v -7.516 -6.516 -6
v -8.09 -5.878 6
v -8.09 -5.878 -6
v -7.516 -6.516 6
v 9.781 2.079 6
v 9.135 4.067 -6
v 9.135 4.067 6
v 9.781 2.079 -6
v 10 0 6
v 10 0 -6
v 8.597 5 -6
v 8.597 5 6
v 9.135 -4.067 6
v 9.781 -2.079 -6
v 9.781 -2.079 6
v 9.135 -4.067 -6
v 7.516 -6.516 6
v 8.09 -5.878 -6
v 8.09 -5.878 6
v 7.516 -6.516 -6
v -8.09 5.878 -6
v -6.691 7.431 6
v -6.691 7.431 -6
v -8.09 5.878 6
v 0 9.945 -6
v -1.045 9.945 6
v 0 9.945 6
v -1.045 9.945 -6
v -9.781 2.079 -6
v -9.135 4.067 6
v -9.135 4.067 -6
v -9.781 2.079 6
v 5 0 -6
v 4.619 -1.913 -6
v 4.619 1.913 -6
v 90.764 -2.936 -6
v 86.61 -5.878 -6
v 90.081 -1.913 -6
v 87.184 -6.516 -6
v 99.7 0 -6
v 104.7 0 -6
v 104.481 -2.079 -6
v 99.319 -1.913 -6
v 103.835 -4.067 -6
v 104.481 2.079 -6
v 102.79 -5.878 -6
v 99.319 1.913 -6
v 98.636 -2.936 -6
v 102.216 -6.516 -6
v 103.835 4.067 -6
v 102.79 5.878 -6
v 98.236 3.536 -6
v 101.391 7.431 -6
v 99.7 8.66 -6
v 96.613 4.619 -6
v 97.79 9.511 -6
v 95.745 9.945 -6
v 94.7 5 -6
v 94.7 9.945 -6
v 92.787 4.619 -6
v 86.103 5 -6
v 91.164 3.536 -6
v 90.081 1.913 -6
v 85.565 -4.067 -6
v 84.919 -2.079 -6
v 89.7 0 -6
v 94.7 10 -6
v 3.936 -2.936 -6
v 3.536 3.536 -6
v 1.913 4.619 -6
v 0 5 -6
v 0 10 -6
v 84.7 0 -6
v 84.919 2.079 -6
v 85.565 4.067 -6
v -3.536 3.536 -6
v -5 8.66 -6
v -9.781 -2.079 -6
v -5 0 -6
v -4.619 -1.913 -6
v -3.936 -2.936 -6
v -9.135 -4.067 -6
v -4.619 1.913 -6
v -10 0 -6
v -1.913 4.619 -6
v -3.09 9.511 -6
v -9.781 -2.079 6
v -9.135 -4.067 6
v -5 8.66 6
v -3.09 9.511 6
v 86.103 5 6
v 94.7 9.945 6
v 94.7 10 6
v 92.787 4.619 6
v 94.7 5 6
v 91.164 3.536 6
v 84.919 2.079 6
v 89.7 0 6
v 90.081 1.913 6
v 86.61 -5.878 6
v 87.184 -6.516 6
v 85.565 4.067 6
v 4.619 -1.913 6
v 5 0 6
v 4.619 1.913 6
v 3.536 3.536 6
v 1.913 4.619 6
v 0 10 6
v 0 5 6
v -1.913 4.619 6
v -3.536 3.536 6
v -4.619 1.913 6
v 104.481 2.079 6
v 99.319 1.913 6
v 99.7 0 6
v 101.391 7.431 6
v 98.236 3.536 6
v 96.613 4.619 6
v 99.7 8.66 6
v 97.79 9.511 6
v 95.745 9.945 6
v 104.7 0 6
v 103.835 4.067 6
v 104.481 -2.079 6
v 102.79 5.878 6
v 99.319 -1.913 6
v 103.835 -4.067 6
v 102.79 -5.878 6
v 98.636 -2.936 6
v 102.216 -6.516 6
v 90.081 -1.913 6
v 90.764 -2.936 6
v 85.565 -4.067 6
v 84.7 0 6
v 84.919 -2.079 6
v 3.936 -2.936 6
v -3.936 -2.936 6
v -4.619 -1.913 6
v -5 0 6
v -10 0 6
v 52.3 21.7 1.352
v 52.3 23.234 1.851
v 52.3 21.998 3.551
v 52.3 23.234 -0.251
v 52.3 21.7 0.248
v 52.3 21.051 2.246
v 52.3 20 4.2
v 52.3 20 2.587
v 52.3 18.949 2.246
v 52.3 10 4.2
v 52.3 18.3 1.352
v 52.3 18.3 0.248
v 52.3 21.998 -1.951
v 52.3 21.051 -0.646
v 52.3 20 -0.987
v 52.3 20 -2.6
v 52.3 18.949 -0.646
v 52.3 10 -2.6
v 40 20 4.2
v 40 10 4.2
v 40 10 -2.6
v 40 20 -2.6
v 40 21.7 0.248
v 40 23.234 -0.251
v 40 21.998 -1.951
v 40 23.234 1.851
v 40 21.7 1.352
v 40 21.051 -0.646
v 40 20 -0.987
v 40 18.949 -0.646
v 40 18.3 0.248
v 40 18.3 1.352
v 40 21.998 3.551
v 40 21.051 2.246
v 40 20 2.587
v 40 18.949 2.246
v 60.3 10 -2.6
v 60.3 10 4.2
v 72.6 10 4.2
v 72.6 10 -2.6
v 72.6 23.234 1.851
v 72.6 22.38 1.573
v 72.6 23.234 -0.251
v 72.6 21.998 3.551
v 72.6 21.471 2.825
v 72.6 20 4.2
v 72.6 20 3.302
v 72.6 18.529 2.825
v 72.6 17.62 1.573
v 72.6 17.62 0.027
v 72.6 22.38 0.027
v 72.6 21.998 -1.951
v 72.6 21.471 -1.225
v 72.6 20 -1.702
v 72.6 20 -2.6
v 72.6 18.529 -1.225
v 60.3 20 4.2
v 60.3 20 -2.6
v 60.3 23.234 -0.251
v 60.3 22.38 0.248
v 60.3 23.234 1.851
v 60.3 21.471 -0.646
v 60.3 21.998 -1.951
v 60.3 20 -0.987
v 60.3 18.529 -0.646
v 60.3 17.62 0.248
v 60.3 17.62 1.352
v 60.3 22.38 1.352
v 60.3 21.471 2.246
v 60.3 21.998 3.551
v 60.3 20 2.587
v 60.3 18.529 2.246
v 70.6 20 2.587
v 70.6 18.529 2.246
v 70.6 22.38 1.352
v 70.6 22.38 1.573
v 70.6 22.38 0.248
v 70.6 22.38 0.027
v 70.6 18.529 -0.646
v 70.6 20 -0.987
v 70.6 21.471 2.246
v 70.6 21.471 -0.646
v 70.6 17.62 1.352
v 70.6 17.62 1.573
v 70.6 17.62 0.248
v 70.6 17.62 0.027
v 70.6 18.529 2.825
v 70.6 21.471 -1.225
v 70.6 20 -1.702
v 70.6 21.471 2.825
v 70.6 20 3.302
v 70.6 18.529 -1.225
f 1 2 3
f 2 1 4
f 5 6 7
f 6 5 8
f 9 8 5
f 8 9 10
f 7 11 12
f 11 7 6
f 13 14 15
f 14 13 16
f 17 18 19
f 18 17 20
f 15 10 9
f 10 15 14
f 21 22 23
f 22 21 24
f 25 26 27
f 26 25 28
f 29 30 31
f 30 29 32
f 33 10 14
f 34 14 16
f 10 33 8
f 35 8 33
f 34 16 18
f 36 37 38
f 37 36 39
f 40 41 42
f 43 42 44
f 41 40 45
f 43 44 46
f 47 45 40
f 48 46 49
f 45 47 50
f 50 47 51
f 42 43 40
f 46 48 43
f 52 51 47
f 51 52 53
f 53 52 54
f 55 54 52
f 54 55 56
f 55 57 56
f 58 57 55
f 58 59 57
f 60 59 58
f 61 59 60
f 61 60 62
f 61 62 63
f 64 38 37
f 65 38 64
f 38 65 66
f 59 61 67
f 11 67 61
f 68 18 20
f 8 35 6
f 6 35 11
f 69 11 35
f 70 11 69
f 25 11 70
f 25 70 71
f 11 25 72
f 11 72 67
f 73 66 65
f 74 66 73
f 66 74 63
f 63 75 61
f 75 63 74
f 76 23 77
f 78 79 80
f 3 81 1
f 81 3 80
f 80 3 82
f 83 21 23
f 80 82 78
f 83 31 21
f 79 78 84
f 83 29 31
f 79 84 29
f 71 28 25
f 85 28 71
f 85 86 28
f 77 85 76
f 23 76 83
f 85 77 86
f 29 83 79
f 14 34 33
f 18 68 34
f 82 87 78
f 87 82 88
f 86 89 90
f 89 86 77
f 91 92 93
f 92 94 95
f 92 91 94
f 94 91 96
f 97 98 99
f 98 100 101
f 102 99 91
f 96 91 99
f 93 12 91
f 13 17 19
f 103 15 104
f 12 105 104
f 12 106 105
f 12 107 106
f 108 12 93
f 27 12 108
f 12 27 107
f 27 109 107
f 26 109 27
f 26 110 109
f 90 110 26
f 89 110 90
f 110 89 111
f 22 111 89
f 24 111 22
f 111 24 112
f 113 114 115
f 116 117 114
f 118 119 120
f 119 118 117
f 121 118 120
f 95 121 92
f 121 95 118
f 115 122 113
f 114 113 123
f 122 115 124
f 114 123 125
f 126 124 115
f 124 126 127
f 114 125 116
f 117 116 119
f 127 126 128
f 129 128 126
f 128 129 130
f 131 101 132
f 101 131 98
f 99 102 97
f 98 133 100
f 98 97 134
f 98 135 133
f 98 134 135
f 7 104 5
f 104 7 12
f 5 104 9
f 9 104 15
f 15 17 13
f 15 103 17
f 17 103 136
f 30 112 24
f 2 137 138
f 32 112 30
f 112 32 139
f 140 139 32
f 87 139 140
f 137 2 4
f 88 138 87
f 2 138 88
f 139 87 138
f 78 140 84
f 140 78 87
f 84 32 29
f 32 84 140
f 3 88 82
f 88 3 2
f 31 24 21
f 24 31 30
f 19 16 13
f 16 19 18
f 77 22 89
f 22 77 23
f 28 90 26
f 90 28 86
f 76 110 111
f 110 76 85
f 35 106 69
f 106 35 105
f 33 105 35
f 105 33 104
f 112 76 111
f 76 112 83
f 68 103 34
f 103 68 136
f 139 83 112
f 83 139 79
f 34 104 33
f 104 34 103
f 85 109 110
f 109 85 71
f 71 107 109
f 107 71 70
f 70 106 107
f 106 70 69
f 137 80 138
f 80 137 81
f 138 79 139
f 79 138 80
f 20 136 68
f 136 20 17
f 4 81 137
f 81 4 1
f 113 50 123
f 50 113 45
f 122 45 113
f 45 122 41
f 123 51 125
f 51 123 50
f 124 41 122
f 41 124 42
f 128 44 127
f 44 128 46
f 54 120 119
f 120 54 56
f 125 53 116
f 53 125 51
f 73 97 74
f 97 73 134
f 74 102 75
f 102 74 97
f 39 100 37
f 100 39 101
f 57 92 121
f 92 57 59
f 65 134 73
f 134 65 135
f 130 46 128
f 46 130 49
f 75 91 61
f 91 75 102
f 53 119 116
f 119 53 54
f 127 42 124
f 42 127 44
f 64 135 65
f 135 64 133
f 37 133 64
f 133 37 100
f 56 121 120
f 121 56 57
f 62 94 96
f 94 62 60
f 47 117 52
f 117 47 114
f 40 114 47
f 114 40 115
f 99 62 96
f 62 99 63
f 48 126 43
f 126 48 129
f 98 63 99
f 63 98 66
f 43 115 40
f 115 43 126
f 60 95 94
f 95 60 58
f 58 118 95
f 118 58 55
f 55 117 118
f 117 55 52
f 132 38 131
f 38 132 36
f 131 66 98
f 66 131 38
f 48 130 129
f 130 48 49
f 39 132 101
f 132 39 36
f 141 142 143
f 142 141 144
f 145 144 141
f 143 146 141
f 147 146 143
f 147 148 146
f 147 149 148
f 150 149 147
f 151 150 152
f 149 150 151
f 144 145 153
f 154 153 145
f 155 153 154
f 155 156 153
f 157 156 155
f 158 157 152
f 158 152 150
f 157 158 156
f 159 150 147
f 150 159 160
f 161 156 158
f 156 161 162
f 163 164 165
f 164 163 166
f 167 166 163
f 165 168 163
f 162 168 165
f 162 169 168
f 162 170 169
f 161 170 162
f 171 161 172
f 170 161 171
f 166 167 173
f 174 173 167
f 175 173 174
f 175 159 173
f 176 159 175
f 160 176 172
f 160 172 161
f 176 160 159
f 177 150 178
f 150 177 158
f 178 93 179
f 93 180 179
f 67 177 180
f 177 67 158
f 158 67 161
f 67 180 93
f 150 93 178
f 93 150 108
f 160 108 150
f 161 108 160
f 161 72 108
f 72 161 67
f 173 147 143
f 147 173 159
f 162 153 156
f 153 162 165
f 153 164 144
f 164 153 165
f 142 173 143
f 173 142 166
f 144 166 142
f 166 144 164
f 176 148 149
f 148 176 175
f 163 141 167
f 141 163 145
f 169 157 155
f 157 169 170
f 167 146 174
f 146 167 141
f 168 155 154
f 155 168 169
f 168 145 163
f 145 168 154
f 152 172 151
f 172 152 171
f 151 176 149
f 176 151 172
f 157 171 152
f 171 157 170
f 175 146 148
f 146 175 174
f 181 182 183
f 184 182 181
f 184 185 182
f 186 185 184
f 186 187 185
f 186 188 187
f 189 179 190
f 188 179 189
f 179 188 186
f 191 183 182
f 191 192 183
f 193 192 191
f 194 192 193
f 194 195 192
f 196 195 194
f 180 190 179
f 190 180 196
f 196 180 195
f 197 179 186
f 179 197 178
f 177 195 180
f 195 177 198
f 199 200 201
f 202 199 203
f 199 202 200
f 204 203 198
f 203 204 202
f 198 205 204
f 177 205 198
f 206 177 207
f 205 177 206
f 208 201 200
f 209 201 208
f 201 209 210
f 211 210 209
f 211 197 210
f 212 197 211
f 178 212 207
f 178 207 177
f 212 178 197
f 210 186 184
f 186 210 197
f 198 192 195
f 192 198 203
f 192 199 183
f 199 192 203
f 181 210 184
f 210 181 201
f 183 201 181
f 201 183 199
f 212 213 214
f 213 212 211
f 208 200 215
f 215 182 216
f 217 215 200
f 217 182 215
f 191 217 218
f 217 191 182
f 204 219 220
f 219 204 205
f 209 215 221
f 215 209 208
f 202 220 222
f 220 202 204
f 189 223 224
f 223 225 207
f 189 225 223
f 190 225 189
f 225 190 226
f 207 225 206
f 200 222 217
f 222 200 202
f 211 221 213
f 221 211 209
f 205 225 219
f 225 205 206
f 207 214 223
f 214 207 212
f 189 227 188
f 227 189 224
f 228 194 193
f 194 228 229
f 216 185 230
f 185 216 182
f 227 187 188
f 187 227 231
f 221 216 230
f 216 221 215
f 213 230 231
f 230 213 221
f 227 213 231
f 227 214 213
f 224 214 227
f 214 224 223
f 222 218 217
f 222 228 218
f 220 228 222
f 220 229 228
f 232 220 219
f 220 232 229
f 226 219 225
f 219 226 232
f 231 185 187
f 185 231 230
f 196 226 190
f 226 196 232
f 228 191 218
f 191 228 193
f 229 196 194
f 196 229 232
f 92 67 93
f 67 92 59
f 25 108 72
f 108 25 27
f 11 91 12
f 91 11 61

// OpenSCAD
/*
This is a mount for the Logitech C270 webcam to attach to the two poles on a car headrest.  May work for other Logitech webcams with similar attachment.
These headrest poles fit a 2016 Subaru Outback.
*/

//Diameter of headrest pole
HeadrestPoleDiameter=10;
//Diameter of the mount (how thick the mount is)
HeadrestPoleMountDiameter=20;
//Height of the mount
HeadrestPoleMountHeight=12;
//Distance between the headrest poles
HeadrestPoleSeparationDistance=84.7;
//Offset of where the webcam mount is located
WebcamAttachmentOffset=40;
PegHeaderHeight=2;

module cylinder_outer(height,radius,fn){
   fudge = 1/cos(180/fn);
   cylinder(h=height,r=radius*fudge,$fn=fn);}

difference(){
    cylinder(h=HeadrestPoleMountHeight, d=HeadrestPoleMountDiameter, center=true);
    cylinder(h=HeadrestPoleMountHeight, d=HeadrestPoleDiameter, center=true);
    translate([0,1,-HeadrestPoleMountHeight/2]) { rotate([0,0,-135]) { cube([HeadrestPoleMountDiameter,HeadrestPoleMountDiameter,HeadrestPoleMountHeight]); } }
}

translate([0,HeadrestPoleDiameter/2,-HeadrestPoleMountHeight/2]) {
    cube([HeadrestPoleSeparationDistance+HeadrestPoleDiameter, (HeadrestPoleMountDiameter-HeadrestPoleDiameter)/2, HeadrestPoleMountHeight]);
}

translate([HeadrestPoleSeparationDistance+HeadrestPoleDiameter,0,0]) {
    difference(){
        cylinder(h=HeadrestPoleMountHeight, d=HeadrestPoleMountDiameter, center=true);
        cylinder(h=HeadrestPoleMountHeight, d=HeadrestPoleDiameter, center=true);
        translate([0,1,-HeadrestPoleMountHeight/2]) { rotate([0,0,-135]) { cube([HeadrestPoleMountDiameter,HeadrestPoleMountDiameter,HeadrestPoleMountHeight]); } }
    }
}

translate([WebcamAttachmentOffset,HeadrestPoleMountDiameter/2,-(HeadrestPoleMountHeight-6.8)/2]){
    difference(){
        union(){
            cube([12.3,10,6.8]);
            rotate([0,90,0]) {
                translate([-6.8/2,10,12.3/2]) {
                    cylinder(h=12.3, d=6.8, $fn=10, center=true);
                    }
            }
        }
        rotate([0,90,0]) {
            translate([-6.8/2,10,12.3/2]) {
                //cylinder(h=12.3, d=3, , center=true);
                cylinder(h=12.3, r=3.4/2*1/cos(180/10), $fn=10, center=true);
            }
        }
    }
}

translate([WebcamAttachmentOffset+20.3,HeadrestPoleMountDiameter/2,-(HeadrestPoleMountHeight-6.8)/2]){
    difference(){
        union(){
            cube([12.3,10,6.8]);
            rotate([0,90,0]) {
                translate([-6.8/2,10,12.3/2]) {
                    cylinder(h=12.3, d=6.8, $fn=10, center=true);
                }
            }
        }
        rotate([0,90,0]) {
            translate([-6.8/2,10,12.3/2]) {
                cylinder(h=12.3, r=3.4/2*1/cos(180/10), $fn=10, center=true);
            }
        }
        rotate([0,90,0]) {
            translate([-6.8/2,10,12.3/2]) {
                scale([1,1.4,1]) {
                    cylinder(h=12.3, r=3.4/2*1/cos(180/10), $fn=10, center=true);
                }
            }
        }
        rotate([0,90,0]) {
            translate([-6.8/2,10,12.3-(PegHeaderHeight/2)]) {
                cylinder(h=PegHeaderHeight, r=1.4*3.4/2*1/cos(180/10), $fn=10, center=true);
            }
        }
    }
}


echo(version=version());
// Written by xoque (mwifall@gmail.com)
//
// To the extent possible under law, the author(s) have dedicated all
// copyright and related and neighboring rights to this software to the
// public domain worldwide. This software is distributed without any
// warranty.
//
// You should have received a copy of the CC0 Public Domain
// Dedication along with this software.
// If not, see <http://creativecommons.org/publicdomain/zero/1.0/>.
